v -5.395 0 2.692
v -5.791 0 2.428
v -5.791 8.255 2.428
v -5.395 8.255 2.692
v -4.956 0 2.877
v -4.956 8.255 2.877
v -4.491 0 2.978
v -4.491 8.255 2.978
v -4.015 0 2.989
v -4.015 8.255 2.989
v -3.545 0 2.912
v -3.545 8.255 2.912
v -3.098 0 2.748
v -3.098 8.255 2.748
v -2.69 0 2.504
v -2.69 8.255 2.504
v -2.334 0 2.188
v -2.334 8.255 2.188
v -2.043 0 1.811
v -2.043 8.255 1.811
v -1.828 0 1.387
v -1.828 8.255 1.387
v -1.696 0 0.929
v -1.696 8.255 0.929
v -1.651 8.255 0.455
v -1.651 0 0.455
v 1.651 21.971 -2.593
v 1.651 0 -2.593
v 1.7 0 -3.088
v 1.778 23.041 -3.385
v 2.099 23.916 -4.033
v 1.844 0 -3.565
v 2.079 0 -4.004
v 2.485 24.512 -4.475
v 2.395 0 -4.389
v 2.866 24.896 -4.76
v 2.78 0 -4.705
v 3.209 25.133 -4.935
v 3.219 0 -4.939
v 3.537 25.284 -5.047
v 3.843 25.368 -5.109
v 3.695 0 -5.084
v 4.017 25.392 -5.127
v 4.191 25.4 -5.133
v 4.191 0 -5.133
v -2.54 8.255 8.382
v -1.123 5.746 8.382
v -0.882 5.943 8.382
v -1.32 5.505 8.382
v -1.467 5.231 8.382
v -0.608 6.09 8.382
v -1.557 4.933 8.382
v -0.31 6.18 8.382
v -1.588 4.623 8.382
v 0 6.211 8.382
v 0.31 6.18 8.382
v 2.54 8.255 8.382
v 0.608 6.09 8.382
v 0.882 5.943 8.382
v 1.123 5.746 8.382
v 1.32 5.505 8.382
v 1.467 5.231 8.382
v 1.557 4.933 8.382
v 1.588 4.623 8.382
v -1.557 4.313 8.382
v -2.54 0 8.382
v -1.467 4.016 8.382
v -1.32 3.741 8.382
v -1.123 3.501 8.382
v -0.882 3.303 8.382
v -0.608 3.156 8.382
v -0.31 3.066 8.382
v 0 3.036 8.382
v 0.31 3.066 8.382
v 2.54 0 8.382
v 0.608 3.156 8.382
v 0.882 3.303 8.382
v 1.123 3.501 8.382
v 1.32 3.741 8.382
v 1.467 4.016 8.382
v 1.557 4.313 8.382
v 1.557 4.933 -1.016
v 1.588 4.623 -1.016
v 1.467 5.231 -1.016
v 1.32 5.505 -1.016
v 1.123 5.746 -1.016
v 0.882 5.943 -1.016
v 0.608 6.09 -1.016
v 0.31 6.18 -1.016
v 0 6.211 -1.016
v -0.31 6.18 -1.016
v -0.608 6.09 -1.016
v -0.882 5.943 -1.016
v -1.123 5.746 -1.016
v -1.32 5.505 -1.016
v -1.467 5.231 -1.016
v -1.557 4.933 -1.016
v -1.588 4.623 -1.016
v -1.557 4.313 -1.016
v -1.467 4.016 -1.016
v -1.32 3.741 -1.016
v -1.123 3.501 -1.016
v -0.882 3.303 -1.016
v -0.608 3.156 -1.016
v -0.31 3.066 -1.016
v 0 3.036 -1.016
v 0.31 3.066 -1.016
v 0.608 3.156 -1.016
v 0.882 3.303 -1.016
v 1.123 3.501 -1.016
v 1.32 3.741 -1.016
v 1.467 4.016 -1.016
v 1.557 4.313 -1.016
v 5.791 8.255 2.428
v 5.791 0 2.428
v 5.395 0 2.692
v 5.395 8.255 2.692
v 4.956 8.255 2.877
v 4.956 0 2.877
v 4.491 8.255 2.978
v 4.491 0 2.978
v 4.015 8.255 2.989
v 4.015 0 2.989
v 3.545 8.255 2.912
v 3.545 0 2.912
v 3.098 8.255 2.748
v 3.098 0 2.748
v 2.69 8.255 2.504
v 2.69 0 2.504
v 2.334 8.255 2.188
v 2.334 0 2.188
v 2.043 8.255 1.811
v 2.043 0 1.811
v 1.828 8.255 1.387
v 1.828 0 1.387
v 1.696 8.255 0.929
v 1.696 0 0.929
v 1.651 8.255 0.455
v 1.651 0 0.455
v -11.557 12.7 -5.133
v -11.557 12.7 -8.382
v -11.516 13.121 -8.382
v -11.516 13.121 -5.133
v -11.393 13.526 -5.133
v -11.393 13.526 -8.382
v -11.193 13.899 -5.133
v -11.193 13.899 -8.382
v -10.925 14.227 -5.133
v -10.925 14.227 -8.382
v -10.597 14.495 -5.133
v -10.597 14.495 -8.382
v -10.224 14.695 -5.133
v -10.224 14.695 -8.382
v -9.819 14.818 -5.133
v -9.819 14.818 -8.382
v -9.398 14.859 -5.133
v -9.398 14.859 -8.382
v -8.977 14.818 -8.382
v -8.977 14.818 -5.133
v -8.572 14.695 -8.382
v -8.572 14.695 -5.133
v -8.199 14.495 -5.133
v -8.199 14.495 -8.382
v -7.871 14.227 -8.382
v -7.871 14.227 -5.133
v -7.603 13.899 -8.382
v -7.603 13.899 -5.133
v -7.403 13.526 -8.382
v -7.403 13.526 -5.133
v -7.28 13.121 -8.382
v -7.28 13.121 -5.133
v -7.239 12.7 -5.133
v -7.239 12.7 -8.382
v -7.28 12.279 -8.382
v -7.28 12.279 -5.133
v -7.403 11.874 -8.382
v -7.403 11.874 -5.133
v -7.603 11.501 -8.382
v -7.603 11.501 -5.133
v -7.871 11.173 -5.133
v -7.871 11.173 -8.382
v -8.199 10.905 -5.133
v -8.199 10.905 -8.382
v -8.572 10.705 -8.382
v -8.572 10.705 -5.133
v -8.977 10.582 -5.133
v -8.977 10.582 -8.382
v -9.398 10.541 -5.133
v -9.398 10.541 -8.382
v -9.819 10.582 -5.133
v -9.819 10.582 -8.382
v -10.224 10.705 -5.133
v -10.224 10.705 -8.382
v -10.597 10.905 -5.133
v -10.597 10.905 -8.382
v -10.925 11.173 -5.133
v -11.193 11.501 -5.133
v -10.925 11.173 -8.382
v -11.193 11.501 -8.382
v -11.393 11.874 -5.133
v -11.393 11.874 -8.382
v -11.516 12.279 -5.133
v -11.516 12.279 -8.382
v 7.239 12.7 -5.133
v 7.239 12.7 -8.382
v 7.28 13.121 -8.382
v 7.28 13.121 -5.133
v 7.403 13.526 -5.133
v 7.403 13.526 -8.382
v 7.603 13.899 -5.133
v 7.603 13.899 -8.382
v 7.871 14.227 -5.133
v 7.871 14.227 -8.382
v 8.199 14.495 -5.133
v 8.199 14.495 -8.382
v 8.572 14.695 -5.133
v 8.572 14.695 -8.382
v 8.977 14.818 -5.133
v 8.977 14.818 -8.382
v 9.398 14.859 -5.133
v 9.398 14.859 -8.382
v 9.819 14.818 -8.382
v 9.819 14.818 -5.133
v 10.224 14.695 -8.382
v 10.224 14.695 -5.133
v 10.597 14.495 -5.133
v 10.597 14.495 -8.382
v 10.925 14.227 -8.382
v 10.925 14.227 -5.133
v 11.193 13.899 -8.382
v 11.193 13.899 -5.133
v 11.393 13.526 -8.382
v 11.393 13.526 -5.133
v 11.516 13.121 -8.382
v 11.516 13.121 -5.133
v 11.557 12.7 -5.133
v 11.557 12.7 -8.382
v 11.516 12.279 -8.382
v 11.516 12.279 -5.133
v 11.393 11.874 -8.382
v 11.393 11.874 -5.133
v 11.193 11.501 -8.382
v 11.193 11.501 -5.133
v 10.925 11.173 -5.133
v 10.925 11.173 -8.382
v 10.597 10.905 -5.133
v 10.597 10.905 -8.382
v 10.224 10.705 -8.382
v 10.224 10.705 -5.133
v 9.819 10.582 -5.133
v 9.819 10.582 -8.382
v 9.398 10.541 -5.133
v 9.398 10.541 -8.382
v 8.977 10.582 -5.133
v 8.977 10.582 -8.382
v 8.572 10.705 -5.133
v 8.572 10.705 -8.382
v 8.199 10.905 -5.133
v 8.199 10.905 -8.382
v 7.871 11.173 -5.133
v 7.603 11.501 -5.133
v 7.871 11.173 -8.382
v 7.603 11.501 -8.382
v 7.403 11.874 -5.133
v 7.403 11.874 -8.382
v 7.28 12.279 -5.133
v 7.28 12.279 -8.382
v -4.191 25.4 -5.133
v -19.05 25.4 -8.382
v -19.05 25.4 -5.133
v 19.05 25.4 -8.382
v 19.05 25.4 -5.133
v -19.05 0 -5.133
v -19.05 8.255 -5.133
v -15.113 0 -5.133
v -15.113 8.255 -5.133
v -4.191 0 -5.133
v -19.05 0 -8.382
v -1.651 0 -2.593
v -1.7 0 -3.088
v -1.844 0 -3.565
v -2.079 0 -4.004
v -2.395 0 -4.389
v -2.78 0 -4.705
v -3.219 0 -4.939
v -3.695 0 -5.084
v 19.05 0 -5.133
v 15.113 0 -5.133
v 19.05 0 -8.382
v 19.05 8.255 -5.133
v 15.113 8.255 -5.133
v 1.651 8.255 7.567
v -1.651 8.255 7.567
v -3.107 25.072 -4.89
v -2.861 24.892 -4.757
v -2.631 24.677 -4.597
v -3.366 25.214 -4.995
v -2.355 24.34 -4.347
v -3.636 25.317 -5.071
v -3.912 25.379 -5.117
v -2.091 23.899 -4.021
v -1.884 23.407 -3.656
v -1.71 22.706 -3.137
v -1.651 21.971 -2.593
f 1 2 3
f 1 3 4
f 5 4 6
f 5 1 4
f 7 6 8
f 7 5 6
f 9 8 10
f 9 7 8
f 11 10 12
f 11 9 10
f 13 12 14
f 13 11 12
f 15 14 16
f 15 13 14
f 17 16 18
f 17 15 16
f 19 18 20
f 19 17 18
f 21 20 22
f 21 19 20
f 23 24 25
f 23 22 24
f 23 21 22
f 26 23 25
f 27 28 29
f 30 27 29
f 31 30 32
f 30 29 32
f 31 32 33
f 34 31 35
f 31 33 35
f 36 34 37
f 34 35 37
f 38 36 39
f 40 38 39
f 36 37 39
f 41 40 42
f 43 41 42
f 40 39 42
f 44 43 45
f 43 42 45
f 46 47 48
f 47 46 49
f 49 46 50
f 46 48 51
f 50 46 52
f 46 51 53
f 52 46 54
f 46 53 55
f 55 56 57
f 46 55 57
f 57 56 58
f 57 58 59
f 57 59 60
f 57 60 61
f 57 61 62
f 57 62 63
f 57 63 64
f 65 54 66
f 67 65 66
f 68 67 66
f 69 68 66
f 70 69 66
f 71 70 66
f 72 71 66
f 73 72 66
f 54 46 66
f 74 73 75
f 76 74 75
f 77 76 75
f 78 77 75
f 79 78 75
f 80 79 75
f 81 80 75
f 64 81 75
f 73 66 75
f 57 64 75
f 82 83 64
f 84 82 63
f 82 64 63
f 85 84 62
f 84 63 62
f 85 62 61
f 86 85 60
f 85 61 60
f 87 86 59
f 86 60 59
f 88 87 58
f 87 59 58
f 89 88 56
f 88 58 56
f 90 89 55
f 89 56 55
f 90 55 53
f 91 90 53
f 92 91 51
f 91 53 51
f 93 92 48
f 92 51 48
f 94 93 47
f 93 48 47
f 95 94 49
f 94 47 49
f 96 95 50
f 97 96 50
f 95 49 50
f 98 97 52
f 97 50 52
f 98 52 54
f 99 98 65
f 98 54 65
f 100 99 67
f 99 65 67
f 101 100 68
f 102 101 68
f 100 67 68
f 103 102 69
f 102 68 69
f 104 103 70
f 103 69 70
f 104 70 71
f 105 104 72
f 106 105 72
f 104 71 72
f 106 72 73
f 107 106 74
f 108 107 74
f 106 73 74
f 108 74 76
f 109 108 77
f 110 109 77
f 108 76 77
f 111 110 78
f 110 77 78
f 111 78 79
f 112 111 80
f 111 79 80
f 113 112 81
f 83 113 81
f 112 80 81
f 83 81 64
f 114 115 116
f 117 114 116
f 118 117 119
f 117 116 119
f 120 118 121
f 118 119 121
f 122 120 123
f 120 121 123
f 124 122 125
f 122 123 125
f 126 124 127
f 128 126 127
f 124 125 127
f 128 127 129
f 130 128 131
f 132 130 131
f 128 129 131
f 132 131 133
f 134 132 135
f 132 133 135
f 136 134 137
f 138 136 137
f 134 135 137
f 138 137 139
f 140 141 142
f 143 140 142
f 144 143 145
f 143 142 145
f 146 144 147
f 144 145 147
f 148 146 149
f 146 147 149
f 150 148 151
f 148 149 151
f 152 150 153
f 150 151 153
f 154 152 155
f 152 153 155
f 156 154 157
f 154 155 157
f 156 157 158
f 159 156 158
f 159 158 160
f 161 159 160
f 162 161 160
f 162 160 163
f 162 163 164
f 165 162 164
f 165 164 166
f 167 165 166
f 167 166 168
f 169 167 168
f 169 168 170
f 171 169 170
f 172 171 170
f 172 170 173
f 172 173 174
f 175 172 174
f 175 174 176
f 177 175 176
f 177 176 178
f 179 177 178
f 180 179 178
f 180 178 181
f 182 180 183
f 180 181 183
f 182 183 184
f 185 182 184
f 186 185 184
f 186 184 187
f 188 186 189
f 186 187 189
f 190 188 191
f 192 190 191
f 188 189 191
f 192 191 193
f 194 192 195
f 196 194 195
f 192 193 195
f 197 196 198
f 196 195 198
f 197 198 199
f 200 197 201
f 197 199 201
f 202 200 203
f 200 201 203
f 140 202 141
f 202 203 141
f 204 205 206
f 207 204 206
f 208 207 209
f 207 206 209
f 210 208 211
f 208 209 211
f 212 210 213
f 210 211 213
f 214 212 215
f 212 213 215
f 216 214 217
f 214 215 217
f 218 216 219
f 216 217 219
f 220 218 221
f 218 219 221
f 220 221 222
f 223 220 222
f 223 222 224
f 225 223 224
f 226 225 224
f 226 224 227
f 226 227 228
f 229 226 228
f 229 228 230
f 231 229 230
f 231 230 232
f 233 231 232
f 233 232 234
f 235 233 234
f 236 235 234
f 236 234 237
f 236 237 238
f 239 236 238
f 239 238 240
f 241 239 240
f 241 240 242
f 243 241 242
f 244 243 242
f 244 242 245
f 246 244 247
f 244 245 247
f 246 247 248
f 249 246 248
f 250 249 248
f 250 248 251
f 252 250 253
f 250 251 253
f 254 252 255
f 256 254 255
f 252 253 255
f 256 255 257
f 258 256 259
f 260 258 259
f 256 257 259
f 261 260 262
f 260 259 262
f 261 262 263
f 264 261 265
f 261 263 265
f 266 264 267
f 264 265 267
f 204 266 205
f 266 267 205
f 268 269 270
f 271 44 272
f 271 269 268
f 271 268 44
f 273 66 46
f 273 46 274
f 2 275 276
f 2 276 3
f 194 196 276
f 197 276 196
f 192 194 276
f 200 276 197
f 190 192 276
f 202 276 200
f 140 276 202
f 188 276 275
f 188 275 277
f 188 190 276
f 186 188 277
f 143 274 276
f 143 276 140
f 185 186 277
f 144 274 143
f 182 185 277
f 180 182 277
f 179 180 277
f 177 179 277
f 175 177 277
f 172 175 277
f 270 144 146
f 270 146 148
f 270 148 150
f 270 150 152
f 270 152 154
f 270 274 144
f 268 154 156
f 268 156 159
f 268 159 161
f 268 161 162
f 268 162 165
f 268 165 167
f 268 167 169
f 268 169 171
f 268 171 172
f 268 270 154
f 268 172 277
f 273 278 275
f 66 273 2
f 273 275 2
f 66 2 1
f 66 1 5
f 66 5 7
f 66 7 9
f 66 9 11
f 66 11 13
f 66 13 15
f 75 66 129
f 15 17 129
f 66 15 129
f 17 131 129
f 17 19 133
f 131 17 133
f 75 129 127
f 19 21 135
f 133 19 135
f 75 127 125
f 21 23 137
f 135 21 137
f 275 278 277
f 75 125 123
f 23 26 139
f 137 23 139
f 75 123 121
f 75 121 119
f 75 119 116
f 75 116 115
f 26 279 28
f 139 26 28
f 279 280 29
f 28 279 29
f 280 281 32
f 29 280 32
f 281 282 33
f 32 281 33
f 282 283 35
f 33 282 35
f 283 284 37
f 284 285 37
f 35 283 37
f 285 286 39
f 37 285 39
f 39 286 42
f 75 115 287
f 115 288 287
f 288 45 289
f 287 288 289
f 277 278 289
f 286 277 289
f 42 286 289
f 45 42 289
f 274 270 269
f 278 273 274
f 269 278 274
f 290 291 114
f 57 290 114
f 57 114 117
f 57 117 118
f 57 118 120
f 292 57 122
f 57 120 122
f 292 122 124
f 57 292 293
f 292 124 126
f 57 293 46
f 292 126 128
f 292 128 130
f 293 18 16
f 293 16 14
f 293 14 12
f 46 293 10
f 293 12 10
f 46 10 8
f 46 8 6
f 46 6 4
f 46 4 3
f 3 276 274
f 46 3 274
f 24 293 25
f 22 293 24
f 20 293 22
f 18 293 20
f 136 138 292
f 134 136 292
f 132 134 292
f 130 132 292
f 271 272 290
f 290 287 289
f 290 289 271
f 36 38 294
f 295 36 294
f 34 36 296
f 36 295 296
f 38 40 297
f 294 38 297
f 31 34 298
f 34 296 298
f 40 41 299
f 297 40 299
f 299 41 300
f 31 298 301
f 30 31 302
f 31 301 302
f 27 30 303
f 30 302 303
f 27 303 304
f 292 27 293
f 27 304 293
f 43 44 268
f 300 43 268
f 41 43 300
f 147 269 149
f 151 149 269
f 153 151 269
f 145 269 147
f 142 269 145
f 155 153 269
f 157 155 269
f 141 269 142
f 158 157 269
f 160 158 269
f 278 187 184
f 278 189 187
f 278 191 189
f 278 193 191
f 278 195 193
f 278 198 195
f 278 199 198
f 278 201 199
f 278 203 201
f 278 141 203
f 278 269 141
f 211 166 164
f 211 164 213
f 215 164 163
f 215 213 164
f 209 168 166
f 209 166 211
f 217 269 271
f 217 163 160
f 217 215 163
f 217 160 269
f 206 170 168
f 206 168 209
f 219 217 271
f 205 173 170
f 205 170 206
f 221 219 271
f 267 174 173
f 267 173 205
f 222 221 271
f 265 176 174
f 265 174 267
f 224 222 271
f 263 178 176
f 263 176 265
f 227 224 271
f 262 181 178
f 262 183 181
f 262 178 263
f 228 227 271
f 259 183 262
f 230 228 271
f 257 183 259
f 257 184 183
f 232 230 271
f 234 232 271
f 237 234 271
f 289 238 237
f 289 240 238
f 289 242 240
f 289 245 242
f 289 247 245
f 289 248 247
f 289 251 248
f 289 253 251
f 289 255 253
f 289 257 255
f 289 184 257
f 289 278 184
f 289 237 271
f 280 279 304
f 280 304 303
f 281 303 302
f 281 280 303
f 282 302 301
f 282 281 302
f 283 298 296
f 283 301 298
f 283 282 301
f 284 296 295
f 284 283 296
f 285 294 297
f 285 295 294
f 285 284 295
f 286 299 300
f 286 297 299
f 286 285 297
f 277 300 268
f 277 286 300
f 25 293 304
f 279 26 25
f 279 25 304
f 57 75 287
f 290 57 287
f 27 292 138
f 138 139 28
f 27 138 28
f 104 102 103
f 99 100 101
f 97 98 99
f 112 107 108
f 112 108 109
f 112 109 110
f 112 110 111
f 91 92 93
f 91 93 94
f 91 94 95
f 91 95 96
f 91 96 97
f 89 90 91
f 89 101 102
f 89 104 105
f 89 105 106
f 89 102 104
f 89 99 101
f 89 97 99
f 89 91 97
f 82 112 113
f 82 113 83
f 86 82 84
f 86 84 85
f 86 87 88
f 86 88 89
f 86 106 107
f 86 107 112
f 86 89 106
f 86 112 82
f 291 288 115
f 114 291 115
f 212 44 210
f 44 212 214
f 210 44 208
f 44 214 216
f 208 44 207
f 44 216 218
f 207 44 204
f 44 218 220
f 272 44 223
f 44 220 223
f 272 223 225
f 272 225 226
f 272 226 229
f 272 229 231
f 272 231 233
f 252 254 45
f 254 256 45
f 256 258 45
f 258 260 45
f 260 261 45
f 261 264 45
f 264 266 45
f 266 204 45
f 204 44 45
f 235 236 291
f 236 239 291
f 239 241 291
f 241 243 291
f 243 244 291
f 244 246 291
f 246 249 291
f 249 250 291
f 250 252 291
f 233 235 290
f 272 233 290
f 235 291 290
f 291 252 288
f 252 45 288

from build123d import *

# Parameters (mm, degrees)
SKETCH1_W               = 38.1
SKETCH1_H               = 16.764
BOSS_EXTRUDE1_DEPTH     = 25.4
CUT_EXTRUDE1_DEPTH      = 33.837789572
CUT_EXTRUDE3_DEPTH      = 33.837789572
CUT_EXTRUDE4_DEPTH      = 17.145
SKETCH7_R               = 2.159
CUT_EXTRUDE5_DEPTH      = 36.903957943
CUT_EXTRUDE6_DEPTH      = 34.822319923
CUT_EXTRUDE6_DEPTH_BACK = 34.822319923
SKETCH10_R              = 1.5875
CUT_EXTRUDE7_DEPTH      = 9.398


with BuildPart() as part:
    # Sketch1 → Boss-Extrude1 (new body)
    with BuildSketch(Plane(origin=(0, 0, 0), x_dir=(1, 0, 0), z_dir=(0, 1, 0))):
        Rectangle(SKETCH1_W, SKETCH1_H)
    extrude(amount=BOSS_EXTRUDE1_DEPTH)

    # Sketch3 → Cut-Extrude1 (cut, through all)
    with BuildSketch(Plane.XZ):
        Polygon((-2.54, 8.382), (-19.05, -5.132614164), (-19.05, 8.382), align=None)
        Polygon((19.05, -5.132614164), (19.05, 8.382), (2.54, 8.382), align=None)
    extrude(amount=-CUT_EXTRUDE1_DEPTH, mode=Mode.SUBTRACT)

    # Sketch5 → Cut-Extrude3 (cut, through all)
    with BuildSketch(Plane.XZ):
        with BuildLine():
            Line((-4.191, -5.132614164), (-15.113, -5.132614164))
            Line((-15.113, -5.132614164), (-5.790995153, 2.428103634))
            ThreePointArc((-5.790995153, 2.428103634), (-3.098385632, 2.748373809), (-1.651, 0.455385836))
            Line((-1.651, 0.455385836), (-1.651, -2.592614164))
            ThreePointArc((-1.651, -2.592614164), (-2.394948776, -4.388665388), (-4.191, -5.132614164))
        make_face()
        with BuildLine():
            Line((1.651, 0.455385836), (1.651, -2.592614164))
            ThreePointArc((1.651, -2.592614164), (2.394948776, -4.388665388), (4.191, -5.132614164))
            Line((4.191, -5.132614164), (15.113, -5.132614164))
            Line((15.113, -5.132614164), (5.790995153, 2.428103634))
            ThreePointArc((5.790995153, 2.428103634), (3.098385632, 2.748373809), (1.651, 0.455385836))
        make_face()
    extrude(amount=-CUT_EXTRUDE3_DEPTH, mode=Mode.SUBTRACT)

    # Sketch6 → Cut-Extrude4 (cut)
    with BuildSketch(Plane(origin=(0, 25.4, 0), x_dir=(1, 0, 0), z_dir=(0, 1, 0))):
        Polygon((1.651, -0.455385836), (1.651, -11.682968512), (19.05, 5.132614164), (4.191, 5.132614164), align=None)
        Polygon((-4.191, 5.132614164), (-1.651, -0.455385836), (-1.651, -11.682968512), (-19.05, 5.132614164), align=None)
    extrude(amount=-CUT_EXTRUDE4_DEPTH, mode=Mode.SUBTRACT)

    # Sketch7 → Cut-Extrude5 (cut, through all)
    with BuildSketch(Plane(origin=(0, 0, -8.382), x_dir=(-1, 0, 0), z_dir=(0, 0, -1))):
        with Locations((-9.398, 12.7)):
            Circle(SKETCH7_R)
        with Locations((9.398, 12.7)):
            Circle(SKETCH7_R)
    extrude(amount=-CUT_EXTRUDE5_DEPTH, mode=Mode.SUBTRACT)

    # Sketch9 → Cut-Extrude6 (cut, two sides: drawn at the far end of the back side and taken through both)
    with BuildSketch(Plane(origin=(1.651, 0, 0), x_dir=(0, 0, -1), z_dir=(1, 0, 0)).offset(-CUT_EXTRUDE6_DEPTH_BACK)):
        Polygon((5.132614164, 25.4), (-7.56675082, 8.255), (-10.075287768, 8.255), (-10.075287768, 25.4), (-7.56675082, 25.4), align=None)
    extrude(amount=CUT_EXTRUDE6_DEPTH + CUT_EXTRUDE6_DEPTH_BACK, mode=Mode.SUBTRACT)

    # Sketch10 → Cut-Extrude7 (cut)
    with BuildSketch(Plane.XY.offset(8.382)):
        with Locations((0, 4.623103893)):
            Circle(SKETCH10_R)
    extrude(amount=-CUT_EXTRUDE7_DEPTH, mode=Mode.SUBTRACT)


solid = part.part
